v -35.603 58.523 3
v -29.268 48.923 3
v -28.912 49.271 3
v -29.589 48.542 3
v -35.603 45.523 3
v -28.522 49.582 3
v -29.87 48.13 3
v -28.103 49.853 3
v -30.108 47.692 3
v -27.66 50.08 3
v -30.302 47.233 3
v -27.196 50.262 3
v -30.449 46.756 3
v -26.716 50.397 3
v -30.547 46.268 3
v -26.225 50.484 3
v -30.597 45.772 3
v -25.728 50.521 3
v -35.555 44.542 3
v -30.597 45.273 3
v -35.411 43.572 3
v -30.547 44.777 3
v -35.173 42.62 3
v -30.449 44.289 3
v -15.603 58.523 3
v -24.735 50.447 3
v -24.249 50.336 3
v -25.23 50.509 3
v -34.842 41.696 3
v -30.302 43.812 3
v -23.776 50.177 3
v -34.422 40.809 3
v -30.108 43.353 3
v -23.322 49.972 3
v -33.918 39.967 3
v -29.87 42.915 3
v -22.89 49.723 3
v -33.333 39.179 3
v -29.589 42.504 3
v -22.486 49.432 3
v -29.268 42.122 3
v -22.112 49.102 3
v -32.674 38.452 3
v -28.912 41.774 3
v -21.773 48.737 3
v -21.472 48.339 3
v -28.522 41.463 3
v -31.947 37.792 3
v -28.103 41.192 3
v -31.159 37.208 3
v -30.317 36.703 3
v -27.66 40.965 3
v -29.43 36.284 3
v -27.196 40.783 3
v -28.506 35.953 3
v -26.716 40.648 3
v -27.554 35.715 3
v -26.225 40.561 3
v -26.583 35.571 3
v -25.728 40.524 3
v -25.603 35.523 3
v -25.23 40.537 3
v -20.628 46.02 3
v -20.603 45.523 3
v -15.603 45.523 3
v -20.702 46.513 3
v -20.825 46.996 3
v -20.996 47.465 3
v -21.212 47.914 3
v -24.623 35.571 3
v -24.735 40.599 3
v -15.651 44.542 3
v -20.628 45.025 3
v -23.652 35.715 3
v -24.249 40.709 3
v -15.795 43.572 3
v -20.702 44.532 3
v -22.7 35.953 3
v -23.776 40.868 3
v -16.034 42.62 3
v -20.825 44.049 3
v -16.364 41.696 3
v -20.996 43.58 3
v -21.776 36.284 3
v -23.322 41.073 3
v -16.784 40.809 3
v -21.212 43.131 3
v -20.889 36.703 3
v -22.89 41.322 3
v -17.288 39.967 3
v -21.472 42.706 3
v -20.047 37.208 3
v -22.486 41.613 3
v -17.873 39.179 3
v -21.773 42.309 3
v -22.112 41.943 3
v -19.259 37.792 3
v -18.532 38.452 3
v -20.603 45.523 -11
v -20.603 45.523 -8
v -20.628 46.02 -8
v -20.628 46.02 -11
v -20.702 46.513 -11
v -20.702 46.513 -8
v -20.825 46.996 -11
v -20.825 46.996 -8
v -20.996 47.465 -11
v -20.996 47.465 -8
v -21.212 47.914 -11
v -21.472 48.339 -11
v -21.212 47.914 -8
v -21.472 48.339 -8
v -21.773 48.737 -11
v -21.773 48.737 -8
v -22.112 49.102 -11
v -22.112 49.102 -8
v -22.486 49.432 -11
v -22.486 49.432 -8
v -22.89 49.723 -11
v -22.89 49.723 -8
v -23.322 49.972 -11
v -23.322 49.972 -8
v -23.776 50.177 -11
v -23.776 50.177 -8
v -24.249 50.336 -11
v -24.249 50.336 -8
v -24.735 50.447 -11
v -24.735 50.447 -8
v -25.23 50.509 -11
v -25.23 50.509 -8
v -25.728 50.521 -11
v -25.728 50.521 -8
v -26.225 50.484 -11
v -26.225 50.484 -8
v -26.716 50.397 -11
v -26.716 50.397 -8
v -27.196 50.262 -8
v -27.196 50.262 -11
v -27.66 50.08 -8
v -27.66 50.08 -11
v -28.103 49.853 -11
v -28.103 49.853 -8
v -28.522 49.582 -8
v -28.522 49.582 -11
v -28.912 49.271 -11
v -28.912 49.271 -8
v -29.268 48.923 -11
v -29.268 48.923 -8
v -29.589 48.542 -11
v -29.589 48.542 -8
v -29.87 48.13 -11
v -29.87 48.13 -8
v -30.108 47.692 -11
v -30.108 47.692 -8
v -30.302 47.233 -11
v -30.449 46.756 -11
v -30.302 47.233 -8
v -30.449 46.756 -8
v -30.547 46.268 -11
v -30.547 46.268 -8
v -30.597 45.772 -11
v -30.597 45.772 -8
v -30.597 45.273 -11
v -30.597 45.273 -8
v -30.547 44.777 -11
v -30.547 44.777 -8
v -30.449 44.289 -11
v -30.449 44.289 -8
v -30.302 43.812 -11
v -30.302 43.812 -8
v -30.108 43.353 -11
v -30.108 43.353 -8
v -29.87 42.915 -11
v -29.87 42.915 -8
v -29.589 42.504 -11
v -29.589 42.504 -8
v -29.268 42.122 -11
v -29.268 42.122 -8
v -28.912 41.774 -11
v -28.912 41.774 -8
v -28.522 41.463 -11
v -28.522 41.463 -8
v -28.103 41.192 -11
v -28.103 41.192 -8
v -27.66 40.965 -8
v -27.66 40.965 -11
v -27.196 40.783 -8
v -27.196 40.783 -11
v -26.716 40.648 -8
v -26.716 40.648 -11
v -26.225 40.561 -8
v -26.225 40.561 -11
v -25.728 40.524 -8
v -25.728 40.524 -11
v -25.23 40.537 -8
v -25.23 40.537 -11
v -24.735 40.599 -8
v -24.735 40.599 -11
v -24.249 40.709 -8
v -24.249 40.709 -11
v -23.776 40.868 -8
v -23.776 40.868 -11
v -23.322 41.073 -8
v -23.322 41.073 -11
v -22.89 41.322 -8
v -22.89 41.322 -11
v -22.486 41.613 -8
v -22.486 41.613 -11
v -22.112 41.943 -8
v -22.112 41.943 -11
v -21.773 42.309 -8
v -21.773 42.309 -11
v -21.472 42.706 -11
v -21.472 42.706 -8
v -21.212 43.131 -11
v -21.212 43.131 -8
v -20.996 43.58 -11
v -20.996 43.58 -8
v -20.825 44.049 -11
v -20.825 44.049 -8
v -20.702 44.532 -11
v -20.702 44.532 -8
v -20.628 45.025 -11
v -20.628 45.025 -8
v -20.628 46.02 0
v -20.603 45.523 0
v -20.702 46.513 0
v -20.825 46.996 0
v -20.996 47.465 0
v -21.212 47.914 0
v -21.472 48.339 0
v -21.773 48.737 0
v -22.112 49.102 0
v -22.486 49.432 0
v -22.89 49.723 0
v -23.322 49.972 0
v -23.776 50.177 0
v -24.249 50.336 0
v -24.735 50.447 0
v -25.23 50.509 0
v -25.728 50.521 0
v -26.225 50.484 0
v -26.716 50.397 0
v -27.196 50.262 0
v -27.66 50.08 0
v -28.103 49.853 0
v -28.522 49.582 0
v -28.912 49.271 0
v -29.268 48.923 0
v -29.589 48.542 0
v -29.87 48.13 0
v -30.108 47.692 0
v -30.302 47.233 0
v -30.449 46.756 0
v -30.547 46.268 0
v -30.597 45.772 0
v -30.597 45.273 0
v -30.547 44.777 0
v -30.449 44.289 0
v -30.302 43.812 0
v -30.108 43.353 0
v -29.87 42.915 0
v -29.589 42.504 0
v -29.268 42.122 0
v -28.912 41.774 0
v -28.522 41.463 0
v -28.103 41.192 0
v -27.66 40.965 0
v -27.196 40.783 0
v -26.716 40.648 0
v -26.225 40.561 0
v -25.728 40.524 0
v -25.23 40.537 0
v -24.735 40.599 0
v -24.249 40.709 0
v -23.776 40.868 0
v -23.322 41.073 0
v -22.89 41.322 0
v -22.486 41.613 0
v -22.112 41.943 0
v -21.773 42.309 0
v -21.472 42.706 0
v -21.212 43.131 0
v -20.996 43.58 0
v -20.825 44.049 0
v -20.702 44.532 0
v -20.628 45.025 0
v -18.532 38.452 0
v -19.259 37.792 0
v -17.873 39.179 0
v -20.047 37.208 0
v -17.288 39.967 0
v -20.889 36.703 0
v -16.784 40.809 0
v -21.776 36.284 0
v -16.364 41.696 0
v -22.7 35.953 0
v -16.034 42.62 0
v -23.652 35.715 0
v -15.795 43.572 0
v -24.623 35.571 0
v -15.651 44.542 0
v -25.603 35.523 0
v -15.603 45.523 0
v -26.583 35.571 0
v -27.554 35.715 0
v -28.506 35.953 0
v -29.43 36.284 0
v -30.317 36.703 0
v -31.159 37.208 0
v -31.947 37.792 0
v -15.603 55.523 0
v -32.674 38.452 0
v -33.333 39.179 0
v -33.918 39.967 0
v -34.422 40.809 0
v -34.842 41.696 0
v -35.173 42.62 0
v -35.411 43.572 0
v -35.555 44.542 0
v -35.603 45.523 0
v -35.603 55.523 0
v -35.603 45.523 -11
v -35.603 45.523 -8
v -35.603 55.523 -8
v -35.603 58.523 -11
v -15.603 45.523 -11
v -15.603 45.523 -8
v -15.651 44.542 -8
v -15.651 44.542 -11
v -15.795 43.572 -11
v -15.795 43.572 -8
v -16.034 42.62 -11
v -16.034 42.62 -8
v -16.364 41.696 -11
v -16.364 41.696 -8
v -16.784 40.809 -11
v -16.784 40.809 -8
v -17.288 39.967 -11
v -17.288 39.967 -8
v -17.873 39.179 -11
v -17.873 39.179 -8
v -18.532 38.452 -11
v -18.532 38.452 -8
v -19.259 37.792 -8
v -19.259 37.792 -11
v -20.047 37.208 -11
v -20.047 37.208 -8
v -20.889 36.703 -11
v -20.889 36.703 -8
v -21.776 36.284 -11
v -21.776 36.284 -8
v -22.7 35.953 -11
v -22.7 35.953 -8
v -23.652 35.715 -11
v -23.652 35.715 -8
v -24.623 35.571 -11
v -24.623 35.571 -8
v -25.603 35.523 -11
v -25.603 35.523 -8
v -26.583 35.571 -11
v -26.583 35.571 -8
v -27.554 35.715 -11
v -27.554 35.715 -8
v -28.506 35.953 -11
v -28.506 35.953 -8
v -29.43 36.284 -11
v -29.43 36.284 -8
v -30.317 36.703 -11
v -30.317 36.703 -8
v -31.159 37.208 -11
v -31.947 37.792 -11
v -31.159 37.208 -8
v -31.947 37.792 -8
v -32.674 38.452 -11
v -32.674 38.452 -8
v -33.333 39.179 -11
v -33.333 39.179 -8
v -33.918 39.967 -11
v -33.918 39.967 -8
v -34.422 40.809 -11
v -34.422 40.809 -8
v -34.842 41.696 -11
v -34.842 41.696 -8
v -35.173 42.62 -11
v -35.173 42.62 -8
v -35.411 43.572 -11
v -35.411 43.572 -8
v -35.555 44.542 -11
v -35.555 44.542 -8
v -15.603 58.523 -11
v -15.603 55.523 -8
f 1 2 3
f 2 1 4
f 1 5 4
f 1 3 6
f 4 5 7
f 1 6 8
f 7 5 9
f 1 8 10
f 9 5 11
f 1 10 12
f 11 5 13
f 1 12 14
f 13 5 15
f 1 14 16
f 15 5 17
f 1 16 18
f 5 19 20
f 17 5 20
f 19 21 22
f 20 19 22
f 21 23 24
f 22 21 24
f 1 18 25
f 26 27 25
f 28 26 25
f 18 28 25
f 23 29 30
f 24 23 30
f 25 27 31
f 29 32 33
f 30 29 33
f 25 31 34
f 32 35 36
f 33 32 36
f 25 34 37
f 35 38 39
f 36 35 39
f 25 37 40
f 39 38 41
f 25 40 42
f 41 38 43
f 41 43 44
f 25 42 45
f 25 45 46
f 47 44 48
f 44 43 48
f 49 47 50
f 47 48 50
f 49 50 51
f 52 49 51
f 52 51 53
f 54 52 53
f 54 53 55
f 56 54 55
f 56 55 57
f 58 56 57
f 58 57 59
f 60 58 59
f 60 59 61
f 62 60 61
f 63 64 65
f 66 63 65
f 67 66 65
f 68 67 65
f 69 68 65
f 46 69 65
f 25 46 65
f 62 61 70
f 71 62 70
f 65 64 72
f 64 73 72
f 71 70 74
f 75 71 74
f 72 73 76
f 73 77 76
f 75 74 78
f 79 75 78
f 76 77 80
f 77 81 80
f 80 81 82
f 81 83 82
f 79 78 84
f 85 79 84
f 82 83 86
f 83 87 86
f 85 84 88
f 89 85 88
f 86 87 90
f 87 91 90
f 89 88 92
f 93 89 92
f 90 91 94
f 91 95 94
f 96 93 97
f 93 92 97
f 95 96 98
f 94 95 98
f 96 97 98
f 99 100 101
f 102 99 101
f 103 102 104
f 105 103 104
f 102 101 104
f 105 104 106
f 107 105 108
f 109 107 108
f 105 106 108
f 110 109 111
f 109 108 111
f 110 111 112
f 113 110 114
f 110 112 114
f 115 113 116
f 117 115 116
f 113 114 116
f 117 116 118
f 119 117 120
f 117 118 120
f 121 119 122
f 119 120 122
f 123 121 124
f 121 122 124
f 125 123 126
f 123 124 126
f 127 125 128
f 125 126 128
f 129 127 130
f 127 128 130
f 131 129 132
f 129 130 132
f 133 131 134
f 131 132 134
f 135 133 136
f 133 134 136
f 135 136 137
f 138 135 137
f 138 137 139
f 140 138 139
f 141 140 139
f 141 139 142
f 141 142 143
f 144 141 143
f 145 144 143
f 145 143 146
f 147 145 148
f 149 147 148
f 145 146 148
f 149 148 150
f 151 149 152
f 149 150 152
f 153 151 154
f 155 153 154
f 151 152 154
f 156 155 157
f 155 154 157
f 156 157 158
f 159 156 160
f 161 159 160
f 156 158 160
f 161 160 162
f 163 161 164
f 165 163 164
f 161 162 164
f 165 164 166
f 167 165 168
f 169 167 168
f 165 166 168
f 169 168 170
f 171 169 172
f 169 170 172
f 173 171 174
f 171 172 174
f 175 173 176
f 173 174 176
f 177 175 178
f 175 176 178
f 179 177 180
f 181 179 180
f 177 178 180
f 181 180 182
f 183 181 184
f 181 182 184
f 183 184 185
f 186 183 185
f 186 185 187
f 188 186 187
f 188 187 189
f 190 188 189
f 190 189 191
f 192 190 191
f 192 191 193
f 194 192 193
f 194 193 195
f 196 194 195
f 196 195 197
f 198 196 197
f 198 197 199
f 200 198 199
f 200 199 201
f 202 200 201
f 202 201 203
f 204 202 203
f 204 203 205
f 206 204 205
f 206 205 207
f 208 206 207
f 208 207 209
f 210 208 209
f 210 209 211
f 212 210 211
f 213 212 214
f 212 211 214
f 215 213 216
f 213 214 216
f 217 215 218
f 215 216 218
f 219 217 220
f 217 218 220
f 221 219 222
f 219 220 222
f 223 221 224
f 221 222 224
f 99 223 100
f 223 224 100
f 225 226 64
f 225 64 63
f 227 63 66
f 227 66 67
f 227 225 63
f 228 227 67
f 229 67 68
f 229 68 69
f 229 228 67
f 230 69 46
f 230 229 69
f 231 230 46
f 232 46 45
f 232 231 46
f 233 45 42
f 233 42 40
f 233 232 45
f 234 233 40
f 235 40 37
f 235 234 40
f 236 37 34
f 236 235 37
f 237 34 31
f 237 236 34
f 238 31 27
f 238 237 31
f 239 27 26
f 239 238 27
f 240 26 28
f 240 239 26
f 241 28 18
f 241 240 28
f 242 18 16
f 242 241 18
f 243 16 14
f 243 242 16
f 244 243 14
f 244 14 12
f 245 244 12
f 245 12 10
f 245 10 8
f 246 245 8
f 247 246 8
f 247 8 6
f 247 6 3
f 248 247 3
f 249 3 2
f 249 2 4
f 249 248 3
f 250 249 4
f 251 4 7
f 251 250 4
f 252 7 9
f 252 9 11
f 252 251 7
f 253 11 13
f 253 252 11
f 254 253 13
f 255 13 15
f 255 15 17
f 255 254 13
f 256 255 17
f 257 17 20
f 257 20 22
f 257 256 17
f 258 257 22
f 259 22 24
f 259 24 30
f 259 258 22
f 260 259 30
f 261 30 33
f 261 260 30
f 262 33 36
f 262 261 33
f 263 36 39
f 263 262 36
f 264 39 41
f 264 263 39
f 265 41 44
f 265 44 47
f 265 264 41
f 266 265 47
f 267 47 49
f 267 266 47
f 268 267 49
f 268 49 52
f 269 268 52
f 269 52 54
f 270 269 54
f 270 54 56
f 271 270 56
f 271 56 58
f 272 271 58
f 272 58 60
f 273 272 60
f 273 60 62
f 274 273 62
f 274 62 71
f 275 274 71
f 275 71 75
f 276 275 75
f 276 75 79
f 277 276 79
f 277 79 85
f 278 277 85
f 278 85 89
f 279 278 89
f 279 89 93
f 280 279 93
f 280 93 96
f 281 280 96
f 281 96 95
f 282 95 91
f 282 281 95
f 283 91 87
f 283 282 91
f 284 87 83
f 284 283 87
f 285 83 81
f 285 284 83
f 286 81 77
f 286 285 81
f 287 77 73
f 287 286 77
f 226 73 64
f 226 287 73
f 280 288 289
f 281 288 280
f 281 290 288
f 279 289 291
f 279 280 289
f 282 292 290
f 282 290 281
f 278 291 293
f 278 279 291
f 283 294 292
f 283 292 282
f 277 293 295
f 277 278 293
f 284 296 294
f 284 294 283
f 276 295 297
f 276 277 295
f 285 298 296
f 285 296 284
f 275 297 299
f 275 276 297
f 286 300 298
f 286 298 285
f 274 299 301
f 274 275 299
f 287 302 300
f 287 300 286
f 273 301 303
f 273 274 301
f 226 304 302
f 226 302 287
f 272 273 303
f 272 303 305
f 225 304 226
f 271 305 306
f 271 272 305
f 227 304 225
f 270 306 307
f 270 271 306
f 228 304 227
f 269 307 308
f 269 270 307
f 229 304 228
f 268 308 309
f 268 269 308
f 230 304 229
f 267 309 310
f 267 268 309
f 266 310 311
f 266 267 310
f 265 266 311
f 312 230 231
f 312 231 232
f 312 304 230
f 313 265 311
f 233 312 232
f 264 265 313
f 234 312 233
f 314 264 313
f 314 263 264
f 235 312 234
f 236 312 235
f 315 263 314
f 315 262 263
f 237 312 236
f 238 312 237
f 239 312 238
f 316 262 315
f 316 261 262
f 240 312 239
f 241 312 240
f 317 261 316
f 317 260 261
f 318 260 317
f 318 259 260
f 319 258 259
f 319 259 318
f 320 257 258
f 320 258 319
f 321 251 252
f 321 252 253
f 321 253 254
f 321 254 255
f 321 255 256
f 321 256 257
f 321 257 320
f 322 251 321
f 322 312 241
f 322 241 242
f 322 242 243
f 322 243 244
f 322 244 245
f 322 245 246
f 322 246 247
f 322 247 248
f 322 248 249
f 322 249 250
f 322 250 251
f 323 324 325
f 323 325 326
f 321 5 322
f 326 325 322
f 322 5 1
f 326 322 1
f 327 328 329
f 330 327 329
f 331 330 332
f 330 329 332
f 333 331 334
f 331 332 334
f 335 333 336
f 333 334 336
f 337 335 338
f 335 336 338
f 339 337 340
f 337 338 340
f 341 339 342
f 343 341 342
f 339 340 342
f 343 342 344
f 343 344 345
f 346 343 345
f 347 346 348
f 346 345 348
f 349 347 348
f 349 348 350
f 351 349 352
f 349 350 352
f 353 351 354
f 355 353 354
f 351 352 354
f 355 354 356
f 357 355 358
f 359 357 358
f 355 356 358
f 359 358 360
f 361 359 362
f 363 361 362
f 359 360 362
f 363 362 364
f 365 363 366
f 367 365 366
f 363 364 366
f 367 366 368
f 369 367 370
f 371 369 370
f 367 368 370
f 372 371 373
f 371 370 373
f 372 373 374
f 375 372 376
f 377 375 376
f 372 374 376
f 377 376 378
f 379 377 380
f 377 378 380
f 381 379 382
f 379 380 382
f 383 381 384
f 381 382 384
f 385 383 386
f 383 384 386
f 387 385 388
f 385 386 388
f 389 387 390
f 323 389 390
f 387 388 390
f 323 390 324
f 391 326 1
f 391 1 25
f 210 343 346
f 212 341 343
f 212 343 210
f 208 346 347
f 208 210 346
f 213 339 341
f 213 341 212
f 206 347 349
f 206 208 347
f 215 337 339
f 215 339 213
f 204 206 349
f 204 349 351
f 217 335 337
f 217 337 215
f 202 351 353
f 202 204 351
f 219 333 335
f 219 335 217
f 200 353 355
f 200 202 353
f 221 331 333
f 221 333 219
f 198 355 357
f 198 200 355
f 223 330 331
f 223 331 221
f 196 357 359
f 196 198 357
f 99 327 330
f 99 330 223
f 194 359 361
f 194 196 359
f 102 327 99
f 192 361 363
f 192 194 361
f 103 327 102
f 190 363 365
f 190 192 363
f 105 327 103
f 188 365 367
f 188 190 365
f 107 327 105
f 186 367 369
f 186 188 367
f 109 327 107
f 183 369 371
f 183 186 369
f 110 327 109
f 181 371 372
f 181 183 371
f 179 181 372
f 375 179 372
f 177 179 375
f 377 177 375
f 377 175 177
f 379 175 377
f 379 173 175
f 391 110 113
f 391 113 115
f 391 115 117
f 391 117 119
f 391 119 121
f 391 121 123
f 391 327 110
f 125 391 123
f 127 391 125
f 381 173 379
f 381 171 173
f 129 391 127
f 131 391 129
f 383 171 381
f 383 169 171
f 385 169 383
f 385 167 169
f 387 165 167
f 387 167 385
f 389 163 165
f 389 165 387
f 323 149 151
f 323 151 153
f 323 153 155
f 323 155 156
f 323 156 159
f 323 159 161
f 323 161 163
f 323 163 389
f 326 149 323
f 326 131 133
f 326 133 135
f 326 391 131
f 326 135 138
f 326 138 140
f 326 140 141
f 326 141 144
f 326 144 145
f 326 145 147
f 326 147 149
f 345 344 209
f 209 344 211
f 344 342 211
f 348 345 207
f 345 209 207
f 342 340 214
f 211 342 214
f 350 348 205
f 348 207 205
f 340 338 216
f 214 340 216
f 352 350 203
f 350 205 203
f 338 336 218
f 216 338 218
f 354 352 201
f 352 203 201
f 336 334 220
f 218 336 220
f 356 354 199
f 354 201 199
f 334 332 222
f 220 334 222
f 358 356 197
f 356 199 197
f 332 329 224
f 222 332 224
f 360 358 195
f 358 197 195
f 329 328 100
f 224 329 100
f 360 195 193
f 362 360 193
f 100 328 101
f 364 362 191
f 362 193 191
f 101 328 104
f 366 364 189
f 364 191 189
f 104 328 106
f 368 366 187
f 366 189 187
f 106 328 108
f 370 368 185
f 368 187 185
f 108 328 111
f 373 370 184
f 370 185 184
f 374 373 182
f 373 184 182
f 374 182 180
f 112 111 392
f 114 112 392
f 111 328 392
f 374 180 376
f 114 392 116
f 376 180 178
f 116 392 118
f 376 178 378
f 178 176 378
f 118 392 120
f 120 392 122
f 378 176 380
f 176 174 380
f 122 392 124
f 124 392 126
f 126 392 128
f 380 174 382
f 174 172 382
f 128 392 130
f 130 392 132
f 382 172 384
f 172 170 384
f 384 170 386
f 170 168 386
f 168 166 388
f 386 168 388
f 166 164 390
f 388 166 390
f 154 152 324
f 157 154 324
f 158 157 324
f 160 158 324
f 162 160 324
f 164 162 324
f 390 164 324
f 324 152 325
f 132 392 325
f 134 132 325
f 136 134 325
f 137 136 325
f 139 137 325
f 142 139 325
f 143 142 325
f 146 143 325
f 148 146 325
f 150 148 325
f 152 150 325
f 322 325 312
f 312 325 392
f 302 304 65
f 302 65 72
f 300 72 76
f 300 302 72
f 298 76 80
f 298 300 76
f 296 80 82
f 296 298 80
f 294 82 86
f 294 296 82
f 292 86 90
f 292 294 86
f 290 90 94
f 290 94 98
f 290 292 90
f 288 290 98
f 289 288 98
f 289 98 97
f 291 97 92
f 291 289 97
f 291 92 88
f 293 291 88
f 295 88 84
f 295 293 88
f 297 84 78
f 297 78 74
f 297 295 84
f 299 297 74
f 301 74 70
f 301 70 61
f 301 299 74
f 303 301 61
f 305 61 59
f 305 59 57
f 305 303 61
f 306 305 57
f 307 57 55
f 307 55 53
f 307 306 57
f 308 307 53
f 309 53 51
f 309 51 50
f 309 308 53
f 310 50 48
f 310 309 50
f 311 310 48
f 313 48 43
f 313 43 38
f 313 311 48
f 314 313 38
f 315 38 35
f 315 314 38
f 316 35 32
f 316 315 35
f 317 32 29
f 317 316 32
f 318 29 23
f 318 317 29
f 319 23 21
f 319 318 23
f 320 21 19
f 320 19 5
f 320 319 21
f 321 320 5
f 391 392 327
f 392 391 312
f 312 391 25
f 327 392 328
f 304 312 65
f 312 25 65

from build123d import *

# Parameters (mm, degrees)
SKETCH_1_R      = 5
EXTRUDE_1_DEPTH = 3
SKETCH_2_W      = 20
SKETCH_2_H      = 14
EXTRUDE_2_DEPTH = 3


with BuildPart() as part:
    # 草图1 → 凸台-拉伸1 (new body)
    with BuildSketch(Plane.XY):
        with BuildLine():
            Line((-35.60315534, 55.522572816), (-15.60315534, 55.522572816))
            Line((-15.60315534, 55.522572816), (-15.60315534, 45.522572816))
            ThreePointArc((-15.60315534, 45.522572816), (-25.60315534, 35.522572816), (-35.60315534, 45.522572816))
            Line((-35.60315534, 45.522572816), (-35.60315534, 55.522572816))
        make_face()
        with Locations((-25.60315534, 45.522572816)):
            Circle(SKETCH_1_R, mode=Mode.SUBTRACT)
    extrude_1 = extrude(amount=EXTRUDE_1_DEPTH)

    # 草图2 → 凸台-拉伸2 (add)
    with BuildSketch(Plane(origin=(0, 55.522572816, 0), x_dir=(1, 0, 0), z_dir=(0, 1, 0))):
        with Locations((-25.60315534, 4)):
            Rectangle(SKETCH_2_W, SKETCH_2_H)
    extrude(amount=EXTRUDE_2_DEPTH)

    # 镜向1: 凸台-拉伸1 across plane
    add(extrude_1.mirror(Plane(origin=(0, 0, -4), x_dir=(1, 0, 0), z_dir=(0, 0, -1))))


solid = part.part
